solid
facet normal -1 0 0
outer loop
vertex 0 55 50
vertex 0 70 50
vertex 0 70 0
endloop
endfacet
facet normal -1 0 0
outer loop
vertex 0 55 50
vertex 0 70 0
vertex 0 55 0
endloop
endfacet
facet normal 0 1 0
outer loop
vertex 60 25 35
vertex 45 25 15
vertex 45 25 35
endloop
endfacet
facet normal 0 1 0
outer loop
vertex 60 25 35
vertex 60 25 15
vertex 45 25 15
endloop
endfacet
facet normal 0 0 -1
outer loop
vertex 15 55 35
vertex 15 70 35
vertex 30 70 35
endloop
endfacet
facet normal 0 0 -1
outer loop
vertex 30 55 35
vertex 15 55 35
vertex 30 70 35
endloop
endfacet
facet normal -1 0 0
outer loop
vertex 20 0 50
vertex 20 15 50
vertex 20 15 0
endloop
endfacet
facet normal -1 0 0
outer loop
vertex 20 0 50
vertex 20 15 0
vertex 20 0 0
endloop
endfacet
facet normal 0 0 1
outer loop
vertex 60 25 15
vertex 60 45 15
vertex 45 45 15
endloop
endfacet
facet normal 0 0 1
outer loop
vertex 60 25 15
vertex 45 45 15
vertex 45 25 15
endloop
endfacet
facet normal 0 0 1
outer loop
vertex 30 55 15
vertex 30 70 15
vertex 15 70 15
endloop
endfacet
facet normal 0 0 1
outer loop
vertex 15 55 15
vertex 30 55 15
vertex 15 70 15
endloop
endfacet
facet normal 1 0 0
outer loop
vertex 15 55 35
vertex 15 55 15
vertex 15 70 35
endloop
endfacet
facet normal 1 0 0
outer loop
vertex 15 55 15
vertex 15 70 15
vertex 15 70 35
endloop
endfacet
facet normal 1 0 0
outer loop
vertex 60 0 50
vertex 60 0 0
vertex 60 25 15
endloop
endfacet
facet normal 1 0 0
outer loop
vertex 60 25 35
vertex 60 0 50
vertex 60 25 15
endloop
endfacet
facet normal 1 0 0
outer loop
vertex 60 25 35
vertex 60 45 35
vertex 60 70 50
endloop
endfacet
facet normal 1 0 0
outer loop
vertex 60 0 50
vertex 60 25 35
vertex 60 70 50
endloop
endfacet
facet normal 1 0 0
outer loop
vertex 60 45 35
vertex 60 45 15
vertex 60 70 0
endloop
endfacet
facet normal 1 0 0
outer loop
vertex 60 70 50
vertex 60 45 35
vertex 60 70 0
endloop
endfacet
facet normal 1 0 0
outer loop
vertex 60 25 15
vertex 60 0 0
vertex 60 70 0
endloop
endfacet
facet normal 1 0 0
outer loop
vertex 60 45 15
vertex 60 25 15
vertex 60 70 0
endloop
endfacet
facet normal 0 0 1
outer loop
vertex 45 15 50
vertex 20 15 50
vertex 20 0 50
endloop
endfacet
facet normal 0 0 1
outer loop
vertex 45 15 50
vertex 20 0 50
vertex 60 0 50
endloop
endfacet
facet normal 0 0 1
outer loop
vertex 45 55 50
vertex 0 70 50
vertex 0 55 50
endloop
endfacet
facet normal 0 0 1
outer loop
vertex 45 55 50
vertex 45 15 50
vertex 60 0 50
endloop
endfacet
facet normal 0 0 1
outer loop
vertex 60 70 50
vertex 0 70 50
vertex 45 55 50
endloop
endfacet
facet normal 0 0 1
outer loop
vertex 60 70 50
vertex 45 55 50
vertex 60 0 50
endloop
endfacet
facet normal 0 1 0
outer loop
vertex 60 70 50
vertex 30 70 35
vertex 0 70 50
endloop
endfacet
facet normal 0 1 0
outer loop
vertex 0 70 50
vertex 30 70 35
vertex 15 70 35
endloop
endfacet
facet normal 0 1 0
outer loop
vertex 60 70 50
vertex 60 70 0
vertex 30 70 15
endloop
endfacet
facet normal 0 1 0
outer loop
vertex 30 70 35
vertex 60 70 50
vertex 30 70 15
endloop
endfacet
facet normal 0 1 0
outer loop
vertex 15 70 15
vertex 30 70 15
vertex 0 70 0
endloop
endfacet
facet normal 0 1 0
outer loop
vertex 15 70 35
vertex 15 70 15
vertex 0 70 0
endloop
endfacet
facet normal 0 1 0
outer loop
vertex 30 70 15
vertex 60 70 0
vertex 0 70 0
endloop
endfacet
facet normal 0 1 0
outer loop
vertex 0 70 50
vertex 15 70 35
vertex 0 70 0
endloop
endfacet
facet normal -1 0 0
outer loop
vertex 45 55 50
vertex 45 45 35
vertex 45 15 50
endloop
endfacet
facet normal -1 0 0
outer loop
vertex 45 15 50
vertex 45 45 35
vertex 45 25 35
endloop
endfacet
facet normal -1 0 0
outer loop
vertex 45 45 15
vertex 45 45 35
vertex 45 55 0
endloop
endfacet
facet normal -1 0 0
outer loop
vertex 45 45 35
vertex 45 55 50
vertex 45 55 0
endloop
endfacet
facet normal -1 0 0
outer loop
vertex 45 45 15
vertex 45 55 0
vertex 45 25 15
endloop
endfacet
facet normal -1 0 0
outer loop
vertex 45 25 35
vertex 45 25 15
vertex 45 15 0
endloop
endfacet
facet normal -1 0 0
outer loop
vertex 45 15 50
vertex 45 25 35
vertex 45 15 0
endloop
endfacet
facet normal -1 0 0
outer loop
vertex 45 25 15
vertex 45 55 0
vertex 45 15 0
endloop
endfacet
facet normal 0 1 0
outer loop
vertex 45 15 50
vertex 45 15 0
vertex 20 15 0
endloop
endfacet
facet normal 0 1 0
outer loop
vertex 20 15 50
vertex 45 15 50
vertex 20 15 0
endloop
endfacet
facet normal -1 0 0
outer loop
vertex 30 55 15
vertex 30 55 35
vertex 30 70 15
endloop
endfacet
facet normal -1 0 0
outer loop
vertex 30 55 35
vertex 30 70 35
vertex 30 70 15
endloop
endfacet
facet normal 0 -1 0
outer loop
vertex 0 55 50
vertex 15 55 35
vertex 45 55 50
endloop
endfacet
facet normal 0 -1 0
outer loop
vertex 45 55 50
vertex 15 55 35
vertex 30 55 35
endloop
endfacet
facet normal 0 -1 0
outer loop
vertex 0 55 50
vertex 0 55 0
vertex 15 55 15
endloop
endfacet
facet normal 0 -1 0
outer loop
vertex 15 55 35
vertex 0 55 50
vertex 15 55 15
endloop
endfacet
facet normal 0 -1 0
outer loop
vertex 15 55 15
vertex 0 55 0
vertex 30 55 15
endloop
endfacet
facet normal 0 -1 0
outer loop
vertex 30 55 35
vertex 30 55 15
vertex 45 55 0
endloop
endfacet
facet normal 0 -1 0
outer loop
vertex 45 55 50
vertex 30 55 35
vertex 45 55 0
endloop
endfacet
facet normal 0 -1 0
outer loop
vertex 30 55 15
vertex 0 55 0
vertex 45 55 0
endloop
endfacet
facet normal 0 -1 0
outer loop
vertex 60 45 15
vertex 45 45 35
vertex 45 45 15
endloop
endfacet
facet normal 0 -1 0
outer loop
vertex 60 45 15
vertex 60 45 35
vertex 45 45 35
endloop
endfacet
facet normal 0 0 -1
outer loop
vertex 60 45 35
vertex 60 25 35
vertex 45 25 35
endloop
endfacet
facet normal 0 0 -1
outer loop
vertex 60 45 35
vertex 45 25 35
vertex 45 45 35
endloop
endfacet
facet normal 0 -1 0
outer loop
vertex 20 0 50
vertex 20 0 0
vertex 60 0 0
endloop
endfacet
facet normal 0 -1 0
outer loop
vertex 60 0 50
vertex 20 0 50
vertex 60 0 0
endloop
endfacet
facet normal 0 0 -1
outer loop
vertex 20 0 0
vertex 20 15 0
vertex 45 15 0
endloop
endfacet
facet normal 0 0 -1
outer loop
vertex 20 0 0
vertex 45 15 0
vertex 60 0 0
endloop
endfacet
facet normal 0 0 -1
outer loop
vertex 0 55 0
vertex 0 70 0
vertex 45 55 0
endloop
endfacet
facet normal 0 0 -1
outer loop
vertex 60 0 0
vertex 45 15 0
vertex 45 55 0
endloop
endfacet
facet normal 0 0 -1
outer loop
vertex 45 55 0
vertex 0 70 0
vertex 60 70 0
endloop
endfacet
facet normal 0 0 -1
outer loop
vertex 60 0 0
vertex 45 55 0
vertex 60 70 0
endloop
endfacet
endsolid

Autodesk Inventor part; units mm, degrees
ref_plane "YZ Plane" through (0, 0, 0) normal (1, 0, 0) x (0, 1, 0)
ref_plane "XZ Plane" through (0, 0, 0) normal (0, 1, 0) x (-1, 0, 0)
ref_plane "XY Plane" through (0, 0, 0) normal (0, 0, 1) x (1, 0, 0)
sketch "Sketch1" plane through (0, 0, 0) normal (0, 0, 1) x (1, 0, 0)
  line L0 (20, 0) -> (60, 0)
  line L1 (60, 0) -> (60, 70)
  line L2 (60, 70) -> (0, 70)
  line L3 (0, 70) -> (0, 55)
  line L4 (0, 55) -> (45, 55)
  line L5 (45, 55) -> (45, 15)
  line L6 (45, 15) -> (20, 15)
  line L7 (20, 15) -> (20, 0)
  point P0 (0, 0)
  dimension "d0" = 40
  dimension "d1" = 70
extrude "Extrusion1" add sketch "Sketch1" along normal blind 50
sketch "Sketch2" plane through (0, 70, 0) normal (0, 1, 0) x (1, 0, 0)
  line L0 (15, -15) -> (15, -35)
  line L1 (15, -35) -> (30, -35)
  line L2 (30, -35) -> (30, -15)
  line L3 (30, -15) -> (15, -15)
  point P0 (0, 0)
extrude "Extrusion2" cut sketch "Sketch2" against normal blind 15
sketch "Sketch3" plane through (60, 0, 0) normal (1, 0, 0) x (0, 0, -1)
  line L0 (-15, 25) -> (-35, 25)
  line L1 (-35, 25) -> (-35, 45)
  line L2 (-35, 45) -> (-15, 45)
  line L3 (-15, 45) -> (-15, 25)
  point P0 (0, 0)
extrude "Extrusion3" cut sketch "Sketch3" against normal blind 15
properties part number "P3-4"
